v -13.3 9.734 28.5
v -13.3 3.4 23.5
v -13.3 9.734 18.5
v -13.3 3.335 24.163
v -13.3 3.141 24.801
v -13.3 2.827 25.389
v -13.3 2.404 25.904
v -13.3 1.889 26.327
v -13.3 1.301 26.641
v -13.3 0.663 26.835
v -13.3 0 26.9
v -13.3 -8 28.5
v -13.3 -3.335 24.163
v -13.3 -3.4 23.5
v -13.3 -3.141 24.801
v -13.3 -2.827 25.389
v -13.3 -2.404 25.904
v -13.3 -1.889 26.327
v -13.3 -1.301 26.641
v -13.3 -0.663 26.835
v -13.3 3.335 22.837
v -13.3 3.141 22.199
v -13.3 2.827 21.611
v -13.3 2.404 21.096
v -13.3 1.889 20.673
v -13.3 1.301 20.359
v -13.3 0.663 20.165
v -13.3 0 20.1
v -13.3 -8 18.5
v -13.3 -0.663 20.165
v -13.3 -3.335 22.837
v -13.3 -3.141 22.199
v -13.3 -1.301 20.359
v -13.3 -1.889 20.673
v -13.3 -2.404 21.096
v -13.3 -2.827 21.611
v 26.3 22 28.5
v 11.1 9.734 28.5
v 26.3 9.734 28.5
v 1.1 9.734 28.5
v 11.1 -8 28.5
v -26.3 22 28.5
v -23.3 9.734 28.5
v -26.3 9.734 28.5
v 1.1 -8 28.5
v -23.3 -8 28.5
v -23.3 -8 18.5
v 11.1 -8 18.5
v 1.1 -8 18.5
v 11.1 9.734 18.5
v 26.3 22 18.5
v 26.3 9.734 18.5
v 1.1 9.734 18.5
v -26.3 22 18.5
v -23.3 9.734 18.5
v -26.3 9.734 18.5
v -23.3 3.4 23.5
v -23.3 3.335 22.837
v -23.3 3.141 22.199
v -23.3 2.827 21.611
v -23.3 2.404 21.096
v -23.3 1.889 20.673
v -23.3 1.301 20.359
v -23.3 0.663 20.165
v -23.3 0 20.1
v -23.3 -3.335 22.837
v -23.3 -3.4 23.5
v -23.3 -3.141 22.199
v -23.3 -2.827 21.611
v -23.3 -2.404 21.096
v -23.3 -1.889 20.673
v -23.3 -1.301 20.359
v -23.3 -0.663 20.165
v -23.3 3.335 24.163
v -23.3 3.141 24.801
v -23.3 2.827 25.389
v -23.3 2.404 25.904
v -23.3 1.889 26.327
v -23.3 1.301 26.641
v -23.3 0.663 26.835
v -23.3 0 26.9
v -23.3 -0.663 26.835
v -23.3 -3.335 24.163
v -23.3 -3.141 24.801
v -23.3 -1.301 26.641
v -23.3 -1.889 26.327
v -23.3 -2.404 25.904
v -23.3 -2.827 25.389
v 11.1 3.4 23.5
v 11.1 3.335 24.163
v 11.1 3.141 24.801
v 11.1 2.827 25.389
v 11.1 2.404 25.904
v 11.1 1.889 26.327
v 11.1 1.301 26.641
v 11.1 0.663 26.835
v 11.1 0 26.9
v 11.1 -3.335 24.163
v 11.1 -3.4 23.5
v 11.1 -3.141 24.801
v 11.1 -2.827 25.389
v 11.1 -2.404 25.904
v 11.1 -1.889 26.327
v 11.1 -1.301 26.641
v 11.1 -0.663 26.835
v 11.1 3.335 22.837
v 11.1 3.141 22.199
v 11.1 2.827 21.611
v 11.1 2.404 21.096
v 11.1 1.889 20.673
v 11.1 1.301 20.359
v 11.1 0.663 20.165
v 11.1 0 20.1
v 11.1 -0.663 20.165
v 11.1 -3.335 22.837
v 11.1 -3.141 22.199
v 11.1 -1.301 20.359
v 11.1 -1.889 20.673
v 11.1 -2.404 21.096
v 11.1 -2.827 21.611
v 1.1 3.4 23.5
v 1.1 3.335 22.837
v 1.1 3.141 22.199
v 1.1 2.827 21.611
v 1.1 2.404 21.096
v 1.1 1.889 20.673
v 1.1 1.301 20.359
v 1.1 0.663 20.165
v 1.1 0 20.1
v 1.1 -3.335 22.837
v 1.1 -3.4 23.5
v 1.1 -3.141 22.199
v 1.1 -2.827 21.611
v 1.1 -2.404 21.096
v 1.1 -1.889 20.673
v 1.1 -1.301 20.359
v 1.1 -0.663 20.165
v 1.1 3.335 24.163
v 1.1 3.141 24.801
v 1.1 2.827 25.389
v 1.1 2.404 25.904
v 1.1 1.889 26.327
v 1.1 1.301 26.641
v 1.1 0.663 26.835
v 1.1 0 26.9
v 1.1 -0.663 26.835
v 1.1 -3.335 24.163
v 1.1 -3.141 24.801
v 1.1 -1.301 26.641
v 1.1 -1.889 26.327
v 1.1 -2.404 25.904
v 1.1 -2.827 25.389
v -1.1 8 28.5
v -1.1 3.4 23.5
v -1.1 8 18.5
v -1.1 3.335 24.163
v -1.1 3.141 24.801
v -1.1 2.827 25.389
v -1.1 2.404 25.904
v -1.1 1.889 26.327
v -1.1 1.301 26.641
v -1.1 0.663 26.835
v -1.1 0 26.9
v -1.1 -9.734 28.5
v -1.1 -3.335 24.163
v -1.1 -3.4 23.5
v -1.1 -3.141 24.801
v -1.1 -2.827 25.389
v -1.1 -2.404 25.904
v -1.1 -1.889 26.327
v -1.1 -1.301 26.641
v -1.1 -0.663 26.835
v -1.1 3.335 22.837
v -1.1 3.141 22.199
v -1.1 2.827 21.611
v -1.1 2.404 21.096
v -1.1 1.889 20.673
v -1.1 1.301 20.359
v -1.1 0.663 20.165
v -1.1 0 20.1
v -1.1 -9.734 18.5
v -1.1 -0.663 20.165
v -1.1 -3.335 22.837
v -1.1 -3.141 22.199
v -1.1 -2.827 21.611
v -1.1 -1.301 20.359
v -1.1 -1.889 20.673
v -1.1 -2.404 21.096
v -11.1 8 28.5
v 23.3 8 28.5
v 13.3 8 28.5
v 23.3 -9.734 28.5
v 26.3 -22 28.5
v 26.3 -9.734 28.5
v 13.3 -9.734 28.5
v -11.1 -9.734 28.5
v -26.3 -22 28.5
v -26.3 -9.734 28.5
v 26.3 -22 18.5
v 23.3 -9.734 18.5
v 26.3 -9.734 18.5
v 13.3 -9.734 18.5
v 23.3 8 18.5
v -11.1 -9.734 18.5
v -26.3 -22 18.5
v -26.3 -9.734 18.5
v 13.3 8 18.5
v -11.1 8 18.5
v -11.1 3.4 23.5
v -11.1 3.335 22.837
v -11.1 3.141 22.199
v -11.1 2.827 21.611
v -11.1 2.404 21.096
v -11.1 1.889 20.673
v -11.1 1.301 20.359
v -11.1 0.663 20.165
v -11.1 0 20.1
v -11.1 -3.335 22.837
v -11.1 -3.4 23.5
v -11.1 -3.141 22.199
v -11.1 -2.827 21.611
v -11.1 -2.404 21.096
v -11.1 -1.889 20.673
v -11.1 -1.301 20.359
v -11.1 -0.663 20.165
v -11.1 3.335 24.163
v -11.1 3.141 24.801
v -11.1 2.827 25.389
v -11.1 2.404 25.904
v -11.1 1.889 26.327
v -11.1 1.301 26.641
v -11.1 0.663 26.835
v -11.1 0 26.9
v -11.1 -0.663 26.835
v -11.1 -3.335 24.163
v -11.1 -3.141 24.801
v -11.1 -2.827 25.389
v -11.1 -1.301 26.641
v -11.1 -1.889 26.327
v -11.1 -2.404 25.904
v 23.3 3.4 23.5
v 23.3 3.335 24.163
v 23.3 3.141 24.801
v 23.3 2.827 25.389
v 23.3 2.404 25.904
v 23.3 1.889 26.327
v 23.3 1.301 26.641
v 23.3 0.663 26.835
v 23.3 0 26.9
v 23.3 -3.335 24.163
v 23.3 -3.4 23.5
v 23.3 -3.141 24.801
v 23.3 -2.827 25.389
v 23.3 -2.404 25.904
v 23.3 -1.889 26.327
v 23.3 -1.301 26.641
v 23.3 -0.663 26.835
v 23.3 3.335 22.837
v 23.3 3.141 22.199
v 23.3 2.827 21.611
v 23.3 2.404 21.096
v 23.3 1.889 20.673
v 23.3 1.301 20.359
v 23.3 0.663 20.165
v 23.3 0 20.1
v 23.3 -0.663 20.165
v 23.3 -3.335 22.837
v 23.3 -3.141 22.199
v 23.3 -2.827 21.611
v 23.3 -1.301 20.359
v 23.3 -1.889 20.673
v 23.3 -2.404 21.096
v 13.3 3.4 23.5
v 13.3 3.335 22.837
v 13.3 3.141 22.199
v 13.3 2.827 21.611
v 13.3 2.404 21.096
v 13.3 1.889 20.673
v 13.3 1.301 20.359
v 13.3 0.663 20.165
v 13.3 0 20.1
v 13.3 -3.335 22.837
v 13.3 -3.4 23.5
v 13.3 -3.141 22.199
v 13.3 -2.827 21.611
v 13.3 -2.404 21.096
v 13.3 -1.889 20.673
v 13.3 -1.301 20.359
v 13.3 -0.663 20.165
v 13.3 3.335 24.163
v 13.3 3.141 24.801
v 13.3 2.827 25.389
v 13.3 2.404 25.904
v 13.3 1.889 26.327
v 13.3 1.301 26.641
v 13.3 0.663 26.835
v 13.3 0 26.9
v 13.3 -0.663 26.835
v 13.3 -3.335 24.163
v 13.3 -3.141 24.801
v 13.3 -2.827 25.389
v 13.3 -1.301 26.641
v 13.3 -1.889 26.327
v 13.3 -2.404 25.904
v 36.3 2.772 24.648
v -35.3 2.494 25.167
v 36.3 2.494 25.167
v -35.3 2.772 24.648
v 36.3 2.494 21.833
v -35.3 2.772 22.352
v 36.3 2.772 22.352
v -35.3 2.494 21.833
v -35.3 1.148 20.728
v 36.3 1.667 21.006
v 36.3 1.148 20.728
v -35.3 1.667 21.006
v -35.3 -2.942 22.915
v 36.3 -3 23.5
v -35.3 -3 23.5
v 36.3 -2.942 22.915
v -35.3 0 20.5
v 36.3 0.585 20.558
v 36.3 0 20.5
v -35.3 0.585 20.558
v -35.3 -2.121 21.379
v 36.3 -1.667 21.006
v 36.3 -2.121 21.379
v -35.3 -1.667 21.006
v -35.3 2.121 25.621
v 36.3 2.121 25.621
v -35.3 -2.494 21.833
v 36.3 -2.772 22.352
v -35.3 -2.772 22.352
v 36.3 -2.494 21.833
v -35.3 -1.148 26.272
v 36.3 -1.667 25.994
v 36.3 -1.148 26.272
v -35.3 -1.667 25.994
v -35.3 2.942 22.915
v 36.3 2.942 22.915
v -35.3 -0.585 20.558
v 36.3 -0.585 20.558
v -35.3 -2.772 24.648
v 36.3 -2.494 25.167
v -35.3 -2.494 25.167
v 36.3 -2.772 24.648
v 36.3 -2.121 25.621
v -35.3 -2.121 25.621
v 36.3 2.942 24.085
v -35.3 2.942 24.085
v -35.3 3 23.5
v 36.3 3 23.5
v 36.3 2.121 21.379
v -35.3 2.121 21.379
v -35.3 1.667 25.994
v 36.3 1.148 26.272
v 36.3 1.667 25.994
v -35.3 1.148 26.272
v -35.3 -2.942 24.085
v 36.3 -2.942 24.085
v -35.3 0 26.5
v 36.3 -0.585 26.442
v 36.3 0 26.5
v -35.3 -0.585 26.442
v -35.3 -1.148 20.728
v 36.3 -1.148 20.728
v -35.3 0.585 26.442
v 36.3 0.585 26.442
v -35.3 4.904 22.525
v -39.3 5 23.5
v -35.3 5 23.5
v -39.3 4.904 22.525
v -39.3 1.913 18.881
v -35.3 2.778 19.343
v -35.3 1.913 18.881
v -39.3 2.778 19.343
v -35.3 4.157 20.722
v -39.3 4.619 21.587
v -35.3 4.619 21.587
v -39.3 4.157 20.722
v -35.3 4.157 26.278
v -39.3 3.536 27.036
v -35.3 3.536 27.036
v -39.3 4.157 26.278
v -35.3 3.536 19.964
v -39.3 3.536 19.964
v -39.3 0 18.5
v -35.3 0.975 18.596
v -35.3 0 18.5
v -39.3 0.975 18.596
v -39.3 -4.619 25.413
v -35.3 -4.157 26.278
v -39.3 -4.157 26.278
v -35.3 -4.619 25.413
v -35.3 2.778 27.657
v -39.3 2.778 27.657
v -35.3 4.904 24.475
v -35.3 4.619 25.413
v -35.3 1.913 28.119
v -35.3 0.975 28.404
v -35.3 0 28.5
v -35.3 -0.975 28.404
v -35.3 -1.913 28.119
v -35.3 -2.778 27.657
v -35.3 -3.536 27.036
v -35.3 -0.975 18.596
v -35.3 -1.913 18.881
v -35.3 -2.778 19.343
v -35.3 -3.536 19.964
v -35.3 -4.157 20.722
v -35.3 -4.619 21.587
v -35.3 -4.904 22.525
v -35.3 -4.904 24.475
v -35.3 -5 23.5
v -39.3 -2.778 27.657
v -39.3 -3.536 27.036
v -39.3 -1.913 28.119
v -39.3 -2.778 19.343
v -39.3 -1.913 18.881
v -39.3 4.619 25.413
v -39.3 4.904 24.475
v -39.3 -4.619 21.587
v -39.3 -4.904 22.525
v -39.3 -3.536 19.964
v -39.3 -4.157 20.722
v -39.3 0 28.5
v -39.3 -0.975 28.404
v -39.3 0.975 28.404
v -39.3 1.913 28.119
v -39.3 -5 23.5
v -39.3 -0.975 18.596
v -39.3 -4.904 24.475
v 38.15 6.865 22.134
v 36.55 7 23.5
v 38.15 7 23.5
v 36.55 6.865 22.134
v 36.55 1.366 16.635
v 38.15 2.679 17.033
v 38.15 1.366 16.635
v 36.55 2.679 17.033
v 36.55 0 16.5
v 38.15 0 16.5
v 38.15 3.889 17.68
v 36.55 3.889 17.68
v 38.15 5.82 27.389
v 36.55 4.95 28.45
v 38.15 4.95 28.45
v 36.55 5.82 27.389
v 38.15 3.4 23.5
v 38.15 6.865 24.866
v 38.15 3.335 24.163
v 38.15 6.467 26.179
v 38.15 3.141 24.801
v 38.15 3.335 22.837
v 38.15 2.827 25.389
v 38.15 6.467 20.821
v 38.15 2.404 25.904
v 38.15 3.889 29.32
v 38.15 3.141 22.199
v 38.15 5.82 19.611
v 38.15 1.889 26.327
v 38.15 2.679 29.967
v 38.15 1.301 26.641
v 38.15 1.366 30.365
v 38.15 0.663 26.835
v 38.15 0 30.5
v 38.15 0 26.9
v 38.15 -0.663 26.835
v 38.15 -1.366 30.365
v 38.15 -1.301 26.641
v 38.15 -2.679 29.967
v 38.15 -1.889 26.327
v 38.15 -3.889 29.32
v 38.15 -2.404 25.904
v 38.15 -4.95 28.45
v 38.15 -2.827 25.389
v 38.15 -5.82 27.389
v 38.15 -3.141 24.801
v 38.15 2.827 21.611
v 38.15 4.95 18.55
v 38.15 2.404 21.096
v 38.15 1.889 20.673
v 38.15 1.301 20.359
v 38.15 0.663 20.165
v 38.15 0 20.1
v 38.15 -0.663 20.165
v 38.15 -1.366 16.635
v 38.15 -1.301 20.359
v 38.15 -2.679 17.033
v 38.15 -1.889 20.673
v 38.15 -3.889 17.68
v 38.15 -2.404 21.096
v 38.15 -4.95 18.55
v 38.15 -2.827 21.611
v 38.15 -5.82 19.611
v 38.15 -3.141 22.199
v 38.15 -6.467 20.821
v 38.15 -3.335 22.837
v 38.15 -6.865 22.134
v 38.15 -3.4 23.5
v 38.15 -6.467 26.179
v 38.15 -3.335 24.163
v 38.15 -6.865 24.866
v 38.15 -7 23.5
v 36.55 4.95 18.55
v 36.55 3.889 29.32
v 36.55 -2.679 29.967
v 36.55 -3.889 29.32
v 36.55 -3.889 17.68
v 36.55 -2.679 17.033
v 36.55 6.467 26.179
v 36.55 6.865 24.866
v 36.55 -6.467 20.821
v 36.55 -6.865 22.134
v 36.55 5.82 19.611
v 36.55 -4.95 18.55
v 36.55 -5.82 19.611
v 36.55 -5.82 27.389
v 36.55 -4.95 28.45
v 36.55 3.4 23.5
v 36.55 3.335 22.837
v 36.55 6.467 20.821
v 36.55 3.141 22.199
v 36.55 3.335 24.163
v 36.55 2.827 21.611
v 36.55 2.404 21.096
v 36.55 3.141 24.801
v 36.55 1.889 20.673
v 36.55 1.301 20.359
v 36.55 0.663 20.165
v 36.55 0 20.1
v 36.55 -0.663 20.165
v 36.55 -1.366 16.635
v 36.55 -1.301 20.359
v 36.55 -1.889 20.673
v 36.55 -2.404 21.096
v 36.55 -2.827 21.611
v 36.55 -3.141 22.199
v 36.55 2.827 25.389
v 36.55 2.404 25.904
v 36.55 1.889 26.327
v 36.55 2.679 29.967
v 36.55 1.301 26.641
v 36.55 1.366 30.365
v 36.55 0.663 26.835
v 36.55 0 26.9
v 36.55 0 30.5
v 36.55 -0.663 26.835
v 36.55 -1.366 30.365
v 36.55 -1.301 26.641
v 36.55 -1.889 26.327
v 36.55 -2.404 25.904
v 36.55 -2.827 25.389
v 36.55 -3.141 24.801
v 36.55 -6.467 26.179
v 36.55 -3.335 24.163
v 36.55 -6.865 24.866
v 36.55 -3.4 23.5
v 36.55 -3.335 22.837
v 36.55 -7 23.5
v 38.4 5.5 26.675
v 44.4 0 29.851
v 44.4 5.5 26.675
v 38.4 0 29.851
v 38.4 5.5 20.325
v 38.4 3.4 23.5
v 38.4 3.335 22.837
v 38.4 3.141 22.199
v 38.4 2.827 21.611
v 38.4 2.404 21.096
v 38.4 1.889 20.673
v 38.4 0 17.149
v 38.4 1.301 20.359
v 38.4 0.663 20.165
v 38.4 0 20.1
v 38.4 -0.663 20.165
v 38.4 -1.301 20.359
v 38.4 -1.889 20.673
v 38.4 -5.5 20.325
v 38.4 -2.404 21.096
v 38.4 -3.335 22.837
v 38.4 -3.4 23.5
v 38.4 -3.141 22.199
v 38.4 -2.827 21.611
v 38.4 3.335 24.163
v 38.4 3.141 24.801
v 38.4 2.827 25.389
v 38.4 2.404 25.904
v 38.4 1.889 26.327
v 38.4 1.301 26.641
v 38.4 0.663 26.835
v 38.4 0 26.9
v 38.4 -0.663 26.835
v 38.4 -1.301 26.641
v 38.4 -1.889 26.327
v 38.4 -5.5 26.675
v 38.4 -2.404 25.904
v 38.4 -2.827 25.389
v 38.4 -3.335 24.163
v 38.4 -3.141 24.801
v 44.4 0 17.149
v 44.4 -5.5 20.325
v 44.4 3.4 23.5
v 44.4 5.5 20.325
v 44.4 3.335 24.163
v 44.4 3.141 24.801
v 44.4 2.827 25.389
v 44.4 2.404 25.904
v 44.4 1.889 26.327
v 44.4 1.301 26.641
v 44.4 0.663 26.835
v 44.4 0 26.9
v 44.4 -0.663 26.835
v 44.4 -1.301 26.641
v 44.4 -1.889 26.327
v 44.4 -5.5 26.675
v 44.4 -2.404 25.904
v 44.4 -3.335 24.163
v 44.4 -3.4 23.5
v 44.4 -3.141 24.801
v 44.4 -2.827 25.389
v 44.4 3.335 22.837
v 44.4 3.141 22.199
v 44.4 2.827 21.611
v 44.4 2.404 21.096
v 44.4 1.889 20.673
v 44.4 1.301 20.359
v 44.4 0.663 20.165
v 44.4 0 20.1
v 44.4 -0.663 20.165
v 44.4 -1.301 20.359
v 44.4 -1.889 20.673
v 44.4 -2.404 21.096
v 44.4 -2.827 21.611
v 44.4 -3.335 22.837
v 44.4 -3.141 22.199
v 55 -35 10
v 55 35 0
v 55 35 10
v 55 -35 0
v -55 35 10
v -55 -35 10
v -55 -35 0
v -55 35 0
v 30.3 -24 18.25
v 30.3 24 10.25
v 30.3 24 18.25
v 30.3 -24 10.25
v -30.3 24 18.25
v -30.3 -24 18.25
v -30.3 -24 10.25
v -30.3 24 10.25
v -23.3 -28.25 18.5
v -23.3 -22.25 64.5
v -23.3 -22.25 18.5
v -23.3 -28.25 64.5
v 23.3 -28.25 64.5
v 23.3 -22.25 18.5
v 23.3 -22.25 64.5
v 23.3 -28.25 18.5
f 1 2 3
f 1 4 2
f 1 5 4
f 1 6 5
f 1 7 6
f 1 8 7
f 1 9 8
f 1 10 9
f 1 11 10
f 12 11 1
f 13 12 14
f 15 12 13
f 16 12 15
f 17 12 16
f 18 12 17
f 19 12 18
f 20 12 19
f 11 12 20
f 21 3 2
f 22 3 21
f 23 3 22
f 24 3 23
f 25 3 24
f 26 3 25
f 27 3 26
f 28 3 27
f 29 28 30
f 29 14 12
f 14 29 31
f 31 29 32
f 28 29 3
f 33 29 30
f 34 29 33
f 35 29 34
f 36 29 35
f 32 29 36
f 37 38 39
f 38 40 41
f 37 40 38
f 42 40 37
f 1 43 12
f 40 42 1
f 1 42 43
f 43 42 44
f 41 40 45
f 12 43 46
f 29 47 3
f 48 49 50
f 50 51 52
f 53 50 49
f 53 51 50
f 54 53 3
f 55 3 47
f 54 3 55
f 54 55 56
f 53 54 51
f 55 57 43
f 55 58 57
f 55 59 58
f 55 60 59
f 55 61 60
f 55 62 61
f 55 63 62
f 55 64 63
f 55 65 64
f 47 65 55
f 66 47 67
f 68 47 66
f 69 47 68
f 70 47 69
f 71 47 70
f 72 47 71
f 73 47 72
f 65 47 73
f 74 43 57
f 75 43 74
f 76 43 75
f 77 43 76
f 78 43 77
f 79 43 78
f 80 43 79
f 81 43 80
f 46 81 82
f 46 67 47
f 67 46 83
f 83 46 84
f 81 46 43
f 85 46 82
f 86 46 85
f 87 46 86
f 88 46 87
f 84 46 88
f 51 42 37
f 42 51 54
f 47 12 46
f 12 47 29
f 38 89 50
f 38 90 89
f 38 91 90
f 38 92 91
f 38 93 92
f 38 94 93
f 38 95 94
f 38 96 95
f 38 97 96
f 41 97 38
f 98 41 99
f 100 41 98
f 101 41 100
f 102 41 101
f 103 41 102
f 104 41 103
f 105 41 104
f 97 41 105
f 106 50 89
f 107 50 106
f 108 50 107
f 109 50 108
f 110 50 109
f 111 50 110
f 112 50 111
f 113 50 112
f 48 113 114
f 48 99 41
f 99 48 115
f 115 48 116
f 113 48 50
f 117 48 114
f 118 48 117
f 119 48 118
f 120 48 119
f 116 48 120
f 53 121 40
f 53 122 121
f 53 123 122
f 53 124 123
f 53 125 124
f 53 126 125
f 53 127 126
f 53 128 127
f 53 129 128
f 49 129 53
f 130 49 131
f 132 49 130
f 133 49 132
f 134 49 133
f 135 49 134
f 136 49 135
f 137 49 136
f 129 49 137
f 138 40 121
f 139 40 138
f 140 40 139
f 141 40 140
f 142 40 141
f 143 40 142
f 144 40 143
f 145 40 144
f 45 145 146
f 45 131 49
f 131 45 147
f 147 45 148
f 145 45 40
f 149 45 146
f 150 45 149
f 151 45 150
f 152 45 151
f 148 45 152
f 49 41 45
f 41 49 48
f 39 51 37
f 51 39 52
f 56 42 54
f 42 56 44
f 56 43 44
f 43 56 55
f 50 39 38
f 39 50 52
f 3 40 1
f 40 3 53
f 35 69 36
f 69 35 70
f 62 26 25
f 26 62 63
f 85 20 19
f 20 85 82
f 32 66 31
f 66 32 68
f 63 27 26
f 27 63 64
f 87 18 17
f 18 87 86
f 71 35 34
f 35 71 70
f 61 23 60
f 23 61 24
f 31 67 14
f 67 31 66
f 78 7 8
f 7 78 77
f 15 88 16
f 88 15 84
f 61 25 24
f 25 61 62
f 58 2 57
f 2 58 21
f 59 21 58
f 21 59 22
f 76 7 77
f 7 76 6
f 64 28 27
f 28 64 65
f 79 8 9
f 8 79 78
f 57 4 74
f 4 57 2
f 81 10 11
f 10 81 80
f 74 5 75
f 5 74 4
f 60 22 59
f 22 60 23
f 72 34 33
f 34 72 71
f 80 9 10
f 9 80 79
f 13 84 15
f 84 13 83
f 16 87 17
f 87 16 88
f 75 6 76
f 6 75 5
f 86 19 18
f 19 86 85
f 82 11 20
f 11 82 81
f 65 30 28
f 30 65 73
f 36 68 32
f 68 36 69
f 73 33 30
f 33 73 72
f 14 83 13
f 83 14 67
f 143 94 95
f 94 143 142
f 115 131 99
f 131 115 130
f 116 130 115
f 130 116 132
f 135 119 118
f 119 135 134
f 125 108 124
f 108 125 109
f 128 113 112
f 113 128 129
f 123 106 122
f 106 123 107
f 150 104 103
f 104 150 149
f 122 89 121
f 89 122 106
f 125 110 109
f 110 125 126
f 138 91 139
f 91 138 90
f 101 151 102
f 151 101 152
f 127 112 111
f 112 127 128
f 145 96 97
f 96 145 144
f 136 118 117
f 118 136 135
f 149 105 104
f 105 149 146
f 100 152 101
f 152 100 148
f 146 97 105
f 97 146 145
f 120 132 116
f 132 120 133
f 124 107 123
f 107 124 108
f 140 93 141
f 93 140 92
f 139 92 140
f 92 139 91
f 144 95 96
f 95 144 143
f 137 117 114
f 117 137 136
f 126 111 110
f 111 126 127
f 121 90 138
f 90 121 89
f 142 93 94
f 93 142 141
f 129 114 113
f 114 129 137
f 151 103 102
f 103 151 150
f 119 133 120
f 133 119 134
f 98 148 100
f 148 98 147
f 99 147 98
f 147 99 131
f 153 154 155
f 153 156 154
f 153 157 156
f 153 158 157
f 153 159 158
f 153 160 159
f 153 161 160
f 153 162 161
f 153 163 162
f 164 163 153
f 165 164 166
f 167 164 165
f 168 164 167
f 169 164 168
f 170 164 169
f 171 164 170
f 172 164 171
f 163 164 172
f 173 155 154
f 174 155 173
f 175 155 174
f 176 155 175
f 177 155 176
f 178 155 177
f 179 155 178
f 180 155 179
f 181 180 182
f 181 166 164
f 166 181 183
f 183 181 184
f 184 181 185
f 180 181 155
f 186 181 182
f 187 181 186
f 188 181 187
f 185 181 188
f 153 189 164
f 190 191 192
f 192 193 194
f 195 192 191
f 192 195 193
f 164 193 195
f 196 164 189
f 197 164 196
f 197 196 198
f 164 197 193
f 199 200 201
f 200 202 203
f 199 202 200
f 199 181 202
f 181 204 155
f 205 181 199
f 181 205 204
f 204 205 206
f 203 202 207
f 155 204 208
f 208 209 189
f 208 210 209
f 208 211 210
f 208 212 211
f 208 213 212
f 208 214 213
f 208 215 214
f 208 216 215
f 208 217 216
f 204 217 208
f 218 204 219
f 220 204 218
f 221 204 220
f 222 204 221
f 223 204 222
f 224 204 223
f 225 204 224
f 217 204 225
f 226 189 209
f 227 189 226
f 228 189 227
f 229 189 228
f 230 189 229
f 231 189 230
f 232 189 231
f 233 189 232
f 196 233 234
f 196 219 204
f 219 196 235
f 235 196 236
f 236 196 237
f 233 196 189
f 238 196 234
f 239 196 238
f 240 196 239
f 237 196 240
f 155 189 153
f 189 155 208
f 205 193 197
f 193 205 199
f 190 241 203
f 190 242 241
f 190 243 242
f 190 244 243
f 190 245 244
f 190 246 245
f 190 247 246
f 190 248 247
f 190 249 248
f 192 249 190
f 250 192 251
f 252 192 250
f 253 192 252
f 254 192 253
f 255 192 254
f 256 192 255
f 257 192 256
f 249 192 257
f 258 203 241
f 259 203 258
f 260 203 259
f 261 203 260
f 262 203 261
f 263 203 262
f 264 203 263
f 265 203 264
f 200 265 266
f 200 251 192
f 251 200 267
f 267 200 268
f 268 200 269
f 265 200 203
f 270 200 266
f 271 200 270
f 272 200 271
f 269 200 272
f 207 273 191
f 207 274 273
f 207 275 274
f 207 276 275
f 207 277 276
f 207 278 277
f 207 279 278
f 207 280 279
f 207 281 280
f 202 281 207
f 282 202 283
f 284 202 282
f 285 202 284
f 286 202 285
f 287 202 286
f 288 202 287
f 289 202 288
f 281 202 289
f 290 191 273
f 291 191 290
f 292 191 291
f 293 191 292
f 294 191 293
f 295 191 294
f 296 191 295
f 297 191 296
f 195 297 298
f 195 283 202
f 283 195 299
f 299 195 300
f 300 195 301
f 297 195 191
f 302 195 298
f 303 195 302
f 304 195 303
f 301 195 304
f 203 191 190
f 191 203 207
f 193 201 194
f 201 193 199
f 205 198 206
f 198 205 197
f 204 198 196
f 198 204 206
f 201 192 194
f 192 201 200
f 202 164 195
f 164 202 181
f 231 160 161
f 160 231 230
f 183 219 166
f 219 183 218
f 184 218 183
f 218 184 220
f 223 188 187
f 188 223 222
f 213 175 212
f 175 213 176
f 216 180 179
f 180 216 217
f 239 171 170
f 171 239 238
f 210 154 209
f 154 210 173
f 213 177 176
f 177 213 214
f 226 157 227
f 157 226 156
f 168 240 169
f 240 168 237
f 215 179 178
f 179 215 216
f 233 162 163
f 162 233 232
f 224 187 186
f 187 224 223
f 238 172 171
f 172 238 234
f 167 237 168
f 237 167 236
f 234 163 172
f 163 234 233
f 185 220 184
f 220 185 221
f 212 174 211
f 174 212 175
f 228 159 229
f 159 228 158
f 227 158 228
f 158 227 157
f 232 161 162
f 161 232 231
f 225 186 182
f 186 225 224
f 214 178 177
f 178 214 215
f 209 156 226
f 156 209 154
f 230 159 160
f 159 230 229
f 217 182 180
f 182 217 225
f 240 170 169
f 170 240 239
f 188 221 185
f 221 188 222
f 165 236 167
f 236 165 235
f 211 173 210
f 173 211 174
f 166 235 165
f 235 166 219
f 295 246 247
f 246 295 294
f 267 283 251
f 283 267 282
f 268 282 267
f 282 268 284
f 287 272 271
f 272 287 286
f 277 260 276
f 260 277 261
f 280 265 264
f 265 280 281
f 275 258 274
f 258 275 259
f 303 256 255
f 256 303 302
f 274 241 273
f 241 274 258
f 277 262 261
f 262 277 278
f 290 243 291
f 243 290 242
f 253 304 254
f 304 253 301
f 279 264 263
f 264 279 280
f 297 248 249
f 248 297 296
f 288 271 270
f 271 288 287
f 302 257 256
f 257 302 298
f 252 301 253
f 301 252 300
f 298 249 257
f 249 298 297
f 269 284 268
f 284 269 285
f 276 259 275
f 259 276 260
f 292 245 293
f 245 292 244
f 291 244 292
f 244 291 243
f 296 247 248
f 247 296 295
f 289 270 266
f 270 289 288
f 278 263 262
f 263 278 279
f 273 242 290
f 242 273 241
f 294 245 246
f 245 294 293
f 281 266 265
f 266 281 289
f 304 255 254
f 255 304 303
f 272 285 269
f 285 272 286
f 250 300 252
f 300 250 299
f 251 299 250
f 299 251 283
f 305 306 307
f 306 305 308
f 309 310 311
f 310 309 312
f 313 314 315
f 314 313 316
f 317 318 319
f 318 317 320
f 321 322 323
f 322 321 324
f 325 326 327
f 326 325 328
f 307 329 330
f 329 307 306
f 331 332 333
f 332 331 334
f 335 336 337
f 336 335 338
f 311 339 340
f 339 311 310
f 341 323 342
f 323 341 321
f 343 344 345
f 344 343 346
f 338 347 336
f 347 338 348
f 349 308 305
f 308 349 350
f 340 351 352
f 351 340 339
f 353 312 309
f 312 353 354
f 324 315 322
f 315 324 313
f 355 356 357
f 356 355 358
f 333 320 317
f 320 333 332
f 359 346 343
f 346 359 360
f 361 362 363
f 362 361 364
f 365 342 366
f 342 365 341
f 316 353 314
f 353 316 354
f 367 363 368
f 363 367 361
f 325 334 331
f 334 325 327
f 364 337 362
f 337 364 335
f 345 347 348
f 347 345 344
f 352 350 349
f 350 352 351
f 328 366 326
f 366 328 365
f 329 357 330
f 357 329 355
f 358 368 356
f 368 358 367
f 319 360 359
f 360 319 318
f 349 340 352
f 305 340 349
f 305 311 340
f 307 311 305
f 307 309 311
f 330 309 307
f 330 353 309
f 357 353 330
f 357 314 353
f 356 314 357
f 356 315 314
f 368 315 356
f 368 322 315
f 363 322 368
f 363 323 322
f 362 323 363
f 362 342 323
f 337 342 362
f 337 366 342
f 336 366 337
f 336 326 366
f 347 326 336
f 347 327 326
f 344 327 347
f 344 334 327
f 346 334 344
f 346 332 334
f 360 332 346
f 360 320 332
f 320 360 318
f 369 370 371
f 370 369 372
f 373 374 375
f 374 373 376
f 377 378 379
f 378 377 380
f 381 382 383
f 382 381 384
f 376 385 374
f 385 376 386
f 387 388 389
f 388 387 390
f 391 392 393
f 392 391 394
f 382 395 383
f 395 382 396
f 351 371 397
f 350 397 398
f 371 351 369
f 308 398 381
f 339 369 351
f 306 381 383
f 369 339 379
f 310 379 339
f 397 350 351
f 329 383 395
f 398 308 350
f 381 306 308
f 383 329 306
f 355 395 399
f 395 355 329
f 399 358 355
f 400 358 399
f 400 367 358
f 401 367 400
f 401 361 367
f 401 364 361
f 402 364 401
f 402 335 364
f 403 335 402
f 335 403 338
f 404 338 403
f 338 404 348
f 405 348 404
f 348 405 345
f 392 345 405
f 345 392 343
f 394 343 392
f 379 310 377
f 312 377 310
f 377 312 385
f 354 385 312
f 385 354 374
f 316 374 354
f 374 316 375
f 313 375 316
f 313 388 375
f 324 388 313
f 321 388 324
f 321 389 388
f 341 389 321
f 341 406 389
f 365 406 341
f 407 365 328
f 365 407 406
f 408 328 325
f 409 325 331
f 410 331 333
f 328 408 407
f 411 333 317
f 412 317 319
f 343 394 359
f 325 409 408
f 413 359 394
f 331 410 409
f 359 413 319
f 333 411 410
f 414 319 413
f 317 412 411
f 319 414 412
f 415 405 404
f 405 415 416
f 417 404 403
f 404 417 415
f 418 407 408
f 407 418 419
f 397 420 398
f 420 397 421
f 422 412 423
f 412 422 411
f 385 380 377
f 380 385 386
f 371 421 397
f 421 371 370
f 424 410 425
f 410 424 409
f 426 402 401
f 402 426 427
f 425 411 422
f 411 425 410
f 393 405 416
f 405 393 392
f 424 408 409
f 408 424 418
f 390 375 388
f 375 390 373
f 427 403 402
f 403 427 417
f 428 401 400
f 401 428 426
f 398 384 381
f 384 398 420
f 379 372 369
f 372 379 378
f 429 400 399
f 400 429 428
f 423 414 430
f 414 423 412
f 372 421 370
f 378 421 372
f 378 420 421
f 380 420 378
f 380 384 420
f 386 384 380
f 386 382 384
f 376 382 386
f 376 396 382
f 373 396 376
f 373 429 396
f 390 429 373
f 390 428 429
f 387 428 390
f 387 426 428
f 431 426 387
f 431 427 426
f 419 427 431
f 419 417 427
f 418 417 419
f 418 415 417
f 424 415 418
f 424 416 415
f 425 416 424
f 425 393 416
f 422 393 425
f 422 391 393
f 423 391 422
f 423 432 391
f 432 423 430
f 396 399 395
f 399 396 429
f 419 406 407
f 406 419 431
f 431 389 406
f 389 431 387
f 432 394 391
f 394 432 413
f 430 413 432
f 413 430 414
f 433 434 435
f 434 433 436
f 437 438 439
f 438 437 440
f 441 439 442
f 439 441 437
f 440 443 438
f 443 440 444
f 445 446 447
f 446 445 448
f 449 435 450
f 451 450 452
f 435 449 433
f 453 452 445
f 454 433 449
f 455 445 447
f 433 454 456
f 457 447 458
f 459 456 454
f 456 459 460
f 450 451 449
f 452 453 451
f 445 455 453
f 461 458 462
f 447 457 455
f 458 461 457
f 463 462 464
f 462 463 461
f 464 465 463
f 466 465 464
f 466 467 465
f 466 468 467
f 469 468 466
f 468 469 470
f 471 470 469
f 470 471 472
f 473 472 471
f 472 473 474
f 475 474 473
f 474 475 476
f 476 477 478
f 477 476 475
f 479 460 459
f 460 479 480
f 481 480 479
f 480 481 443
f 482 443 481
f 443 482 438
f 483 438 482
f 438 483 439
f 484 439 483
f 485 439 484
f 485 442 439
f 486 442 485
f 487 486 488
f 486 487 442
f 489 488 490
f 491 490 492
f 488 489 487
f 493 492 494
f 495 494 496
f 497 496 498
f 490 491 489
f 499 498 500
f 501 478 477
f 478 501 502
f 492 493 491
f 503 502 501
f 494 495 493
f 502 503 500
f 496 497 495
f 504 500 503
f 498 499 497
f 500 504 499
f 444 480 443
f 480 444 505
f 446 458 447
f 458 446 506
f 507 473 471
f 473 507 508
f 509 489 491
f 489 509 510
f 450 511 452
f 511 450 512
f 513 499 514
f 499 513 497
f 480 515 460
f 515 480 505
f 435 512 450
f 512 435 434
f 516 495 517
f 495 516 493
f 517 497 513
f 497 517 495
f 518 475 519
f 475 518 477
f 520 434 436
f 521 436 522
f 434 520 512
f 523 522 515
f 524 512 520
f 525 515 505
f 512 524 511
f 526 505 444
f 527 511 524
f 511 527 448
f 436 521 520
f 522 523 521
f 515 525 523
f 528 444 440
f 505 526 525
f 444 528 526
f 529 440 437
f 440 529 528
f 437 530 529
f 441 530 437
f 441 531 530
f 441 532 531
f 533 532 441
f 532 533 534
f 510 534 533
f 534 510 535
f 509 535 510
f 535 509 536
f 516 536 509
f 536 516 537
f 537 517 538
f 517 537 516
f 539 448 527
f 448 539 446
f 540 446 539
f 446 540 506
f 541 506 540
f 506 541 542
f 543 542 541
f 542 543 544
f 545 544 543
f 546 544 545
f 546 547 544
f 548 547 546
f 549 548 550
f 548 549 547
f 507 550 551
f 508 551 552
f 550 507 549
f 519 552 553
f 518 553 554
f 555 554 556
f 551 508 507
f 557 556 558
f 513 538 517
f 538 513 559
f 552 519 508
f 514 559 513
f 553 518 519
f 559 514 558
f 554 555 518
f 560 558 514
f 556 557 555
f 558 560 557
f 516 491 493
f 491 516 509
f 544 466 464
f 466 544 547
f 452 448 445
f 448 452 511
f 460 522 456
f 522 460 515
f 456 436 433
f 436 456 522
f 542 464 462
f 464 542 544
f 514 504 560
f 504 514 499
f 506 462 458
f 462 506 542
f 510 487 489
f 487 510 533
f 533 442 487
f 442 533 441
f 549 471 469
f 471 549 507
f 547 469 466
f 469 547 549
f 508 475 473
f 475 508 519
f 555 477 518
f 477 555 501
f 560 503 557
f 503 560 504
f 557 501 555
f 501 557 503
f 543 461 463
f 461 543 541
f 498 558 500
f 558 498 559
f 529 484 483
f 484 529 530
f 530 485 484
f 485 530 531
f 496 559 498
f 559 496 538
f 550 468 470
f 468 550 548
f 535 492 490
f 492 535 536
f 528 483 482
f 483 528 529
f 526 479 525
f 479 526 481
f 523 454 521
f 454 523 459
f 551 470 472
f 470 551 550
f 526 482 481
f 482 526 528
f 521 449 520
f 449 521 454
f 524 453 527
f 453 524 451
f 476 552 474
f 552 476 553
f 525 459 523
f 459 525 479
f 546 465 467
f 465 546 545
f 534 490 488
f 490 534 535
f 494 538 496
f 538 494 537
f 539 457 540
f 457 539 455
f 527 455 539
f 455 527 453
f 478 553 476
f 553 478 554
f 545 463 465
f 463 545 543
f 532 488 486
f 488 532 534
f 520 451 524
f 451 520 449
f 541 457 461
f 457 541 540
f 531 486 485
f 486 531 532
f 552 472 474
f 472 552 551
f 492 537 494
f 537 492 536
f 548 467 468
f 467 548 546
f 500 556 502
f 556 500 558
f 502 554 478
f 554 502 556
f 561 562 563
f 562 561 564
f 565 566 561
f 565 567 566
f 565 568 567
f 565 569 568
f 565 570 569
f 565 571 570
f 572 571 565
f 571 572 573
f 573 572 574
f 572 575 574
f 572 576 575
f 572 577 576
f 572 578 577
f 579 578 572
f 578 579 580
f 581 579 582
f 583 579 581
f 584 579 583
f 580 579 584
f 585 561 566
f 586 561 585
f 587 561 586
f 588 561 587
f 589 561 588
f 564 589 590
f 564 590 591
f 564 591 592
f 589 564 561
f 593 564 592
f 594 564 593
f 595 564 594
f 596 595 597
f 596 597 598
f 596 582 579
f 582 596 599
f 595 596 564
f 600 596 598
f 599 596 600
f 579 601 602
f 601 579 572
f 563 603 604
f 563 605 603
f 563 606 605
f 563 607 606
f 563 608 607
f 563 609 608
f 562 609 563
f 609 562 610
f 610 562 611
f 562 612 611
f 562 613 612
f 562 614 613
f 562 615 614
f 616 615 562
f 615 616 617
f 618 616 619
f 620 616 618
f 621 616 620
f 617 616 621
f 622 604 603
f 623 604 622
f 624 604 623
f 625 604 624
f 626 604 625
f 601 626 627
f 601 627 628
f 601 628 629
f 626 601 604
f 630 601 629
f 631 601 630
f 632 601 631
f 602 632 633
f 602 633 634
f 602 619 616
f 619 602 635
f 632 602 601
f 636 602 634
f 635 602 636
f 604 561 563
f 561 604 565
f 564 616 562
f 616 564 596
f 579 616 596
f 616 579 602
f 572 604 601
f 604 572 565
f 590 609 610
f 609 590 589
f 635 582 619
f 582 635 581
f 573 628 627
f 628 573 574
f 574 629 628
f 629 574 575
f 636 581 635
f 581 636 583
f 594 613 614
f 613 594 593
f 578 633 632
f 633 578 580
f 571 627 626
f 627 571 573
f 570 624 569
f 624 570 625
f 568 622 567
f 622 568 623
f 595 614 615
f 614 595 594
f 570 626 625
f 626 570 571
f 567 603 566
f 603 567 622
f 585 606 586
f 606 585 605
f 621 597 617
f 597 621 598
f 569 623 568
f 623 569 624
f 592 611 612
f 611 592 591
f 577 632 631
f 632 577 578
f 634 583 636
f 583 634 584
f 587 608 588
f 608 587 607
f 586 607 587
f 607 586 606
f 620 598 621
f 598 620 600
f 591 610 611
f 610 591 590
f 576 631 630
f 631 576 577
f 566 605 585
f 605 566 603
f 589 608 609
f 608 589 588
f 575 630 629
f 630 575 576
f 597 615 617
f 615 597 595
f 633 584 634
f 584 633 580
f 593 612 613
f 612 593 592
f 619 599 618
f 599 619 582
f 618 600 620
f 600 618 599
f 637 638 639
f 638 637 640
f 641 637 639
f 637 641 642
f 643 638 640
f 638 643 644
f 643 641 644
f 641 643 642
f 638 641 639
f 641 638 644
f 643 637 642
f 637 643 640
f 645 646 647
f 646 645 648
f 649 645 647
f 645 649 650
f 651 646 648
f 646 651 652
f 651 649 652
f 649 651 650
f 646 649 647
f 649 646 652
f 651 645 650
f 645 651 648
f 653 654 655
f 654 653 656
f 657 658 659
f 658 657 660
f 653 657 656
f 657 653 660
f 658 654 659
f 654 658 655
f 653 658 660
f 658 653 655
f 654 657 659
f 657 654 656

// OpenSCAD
$fn = 32;

// ------------------------------------------------------------------------
// Comb hinge with flap: leaf 52.6 x 22 mm, pin d6, flap 46 mm
// Every part is its own module, assembly() places every instance.
// ------------------------------------------------------------------------

// --- part 1 ---
module hinge_bed() {
  difference() {
    translate([-55, -35, 0]) cube([110, 70, 10]);
  }
}

// --- part 2 ---
module hinge_riser() {
  difference() {
    translate([-30.3, -24, 0]) cube([60.6, 48, 8]);
  }
}

// --- part 3 ---
module hinge_leaf_a() {
  difference() {
    union() {
      translate([-23.3, -8, -5]) cube([10, 30, 10]);
      translate([1.1, -8, -5]) cube([10, 30, 10]);
      translate([-26.3, 9.734, -5]) cube([52.6, 12.266, 10]);
    }
    translate([-18.3, 0, 0]) rotate([0, 90, 0]) cylinder(h = 12, d = 6.8, center = true);
    translate([6.1, 0, 0]) rotate([0, 90, 0]) cylinder(h = 12, d = 6.8, center = true);
  }
}

// --- part 4 ---
module hinge_leaf_b() {
  difference() {
    union() {
      translate([-11.1, -22, -5]) cube([10, 30, 10]);
      translate([13.3, -22, -5]) cube([10, 30, 10]);
      translate([-26.3, -22, -5]) cube([52.6, 12.266, 10]);
    }
    translate([-6.1, 0, 0]) rotate([0, 90, 0]) cylinder(h = 12, d = 6.8, center = true);
    translate([18.3, 0, 0]) rotate([0, 90, 0]) cylinder(h = 12, d = 6.8, center = true);
  }
}

// --- part 5 ---
module hinge_flap() {
  difference() {
    translate([-23.3, -23, 0]) cube([46.6, 46, 6]);
  }
}

// --- part 6 ---
module hinge_pin() {
  rotate([0, 90, 0]) cylinder(h = 72.6, d = 6, center = true);
  translate([-39.3, 0, 0]) rotate([0, 90, 0]) cylinder(h = 4, d = 10);
}

// --- part 7 ---
module pin_washer() {
  difference() {
      translate([0, 0, 0]) cylinder(h = 1.6, d = 14);
      translate([0, 0, -1]) cylinder(h = 3.6, d = 6.8);
    }
}

// --- part 8 ---
module pin_nut() {
  difference() {
    linear_extrude(height = 6) polygon(points = [[6.351, 0], [3.175, 5.5], [-3.175, 5.5], [-6.351, 0], [-3.175, -5.5], [3.175, -5.5]]);
    translate([0, 0, -1]) cylinder(h = 8, d = 6.8);
  }
}

// --- assembly ---
module assembly() {
  color([0.80, 0.24, 0.20]) translate([0, 0, 0]) rotate([0, 0, 0]) hinge_bed();
  color([0.20, 0.45, 0.75]) translate([0, 0, 10.25]) rotate([0, 0, 0]) hinge_riser();
  color([0.25, 0.62, 0.32]) translate([0, 0, 23.5]) rotate([0, 0, 0]) hinge_leaf_a();
  color([0.92, 0.70, 0.18]) translate([0, 0, 23.5]) rotate([0, 0, 0]) hinge_leaf_b();
  color([0.58, 0.35, 0.70]) translate([0, -22.25, 41.5]) rotate([90, 0, 0]) hinge_flap();
  color([0.16, 0.66, 0.66]) translate([0, 0, 23.5]) rotate([0, 0, 0]) hinge_pin();
  color([0.85, 0.48, 0.18]) translate([36.55, 0, 23.5]) rotate([0, 90, 0]) pin_washer();
  color([0.55, 0.60, 0.65]) translate([38.4, 0, 23.5]) rotate([0, 90, 0]) pin_nut();
}

assembly();
